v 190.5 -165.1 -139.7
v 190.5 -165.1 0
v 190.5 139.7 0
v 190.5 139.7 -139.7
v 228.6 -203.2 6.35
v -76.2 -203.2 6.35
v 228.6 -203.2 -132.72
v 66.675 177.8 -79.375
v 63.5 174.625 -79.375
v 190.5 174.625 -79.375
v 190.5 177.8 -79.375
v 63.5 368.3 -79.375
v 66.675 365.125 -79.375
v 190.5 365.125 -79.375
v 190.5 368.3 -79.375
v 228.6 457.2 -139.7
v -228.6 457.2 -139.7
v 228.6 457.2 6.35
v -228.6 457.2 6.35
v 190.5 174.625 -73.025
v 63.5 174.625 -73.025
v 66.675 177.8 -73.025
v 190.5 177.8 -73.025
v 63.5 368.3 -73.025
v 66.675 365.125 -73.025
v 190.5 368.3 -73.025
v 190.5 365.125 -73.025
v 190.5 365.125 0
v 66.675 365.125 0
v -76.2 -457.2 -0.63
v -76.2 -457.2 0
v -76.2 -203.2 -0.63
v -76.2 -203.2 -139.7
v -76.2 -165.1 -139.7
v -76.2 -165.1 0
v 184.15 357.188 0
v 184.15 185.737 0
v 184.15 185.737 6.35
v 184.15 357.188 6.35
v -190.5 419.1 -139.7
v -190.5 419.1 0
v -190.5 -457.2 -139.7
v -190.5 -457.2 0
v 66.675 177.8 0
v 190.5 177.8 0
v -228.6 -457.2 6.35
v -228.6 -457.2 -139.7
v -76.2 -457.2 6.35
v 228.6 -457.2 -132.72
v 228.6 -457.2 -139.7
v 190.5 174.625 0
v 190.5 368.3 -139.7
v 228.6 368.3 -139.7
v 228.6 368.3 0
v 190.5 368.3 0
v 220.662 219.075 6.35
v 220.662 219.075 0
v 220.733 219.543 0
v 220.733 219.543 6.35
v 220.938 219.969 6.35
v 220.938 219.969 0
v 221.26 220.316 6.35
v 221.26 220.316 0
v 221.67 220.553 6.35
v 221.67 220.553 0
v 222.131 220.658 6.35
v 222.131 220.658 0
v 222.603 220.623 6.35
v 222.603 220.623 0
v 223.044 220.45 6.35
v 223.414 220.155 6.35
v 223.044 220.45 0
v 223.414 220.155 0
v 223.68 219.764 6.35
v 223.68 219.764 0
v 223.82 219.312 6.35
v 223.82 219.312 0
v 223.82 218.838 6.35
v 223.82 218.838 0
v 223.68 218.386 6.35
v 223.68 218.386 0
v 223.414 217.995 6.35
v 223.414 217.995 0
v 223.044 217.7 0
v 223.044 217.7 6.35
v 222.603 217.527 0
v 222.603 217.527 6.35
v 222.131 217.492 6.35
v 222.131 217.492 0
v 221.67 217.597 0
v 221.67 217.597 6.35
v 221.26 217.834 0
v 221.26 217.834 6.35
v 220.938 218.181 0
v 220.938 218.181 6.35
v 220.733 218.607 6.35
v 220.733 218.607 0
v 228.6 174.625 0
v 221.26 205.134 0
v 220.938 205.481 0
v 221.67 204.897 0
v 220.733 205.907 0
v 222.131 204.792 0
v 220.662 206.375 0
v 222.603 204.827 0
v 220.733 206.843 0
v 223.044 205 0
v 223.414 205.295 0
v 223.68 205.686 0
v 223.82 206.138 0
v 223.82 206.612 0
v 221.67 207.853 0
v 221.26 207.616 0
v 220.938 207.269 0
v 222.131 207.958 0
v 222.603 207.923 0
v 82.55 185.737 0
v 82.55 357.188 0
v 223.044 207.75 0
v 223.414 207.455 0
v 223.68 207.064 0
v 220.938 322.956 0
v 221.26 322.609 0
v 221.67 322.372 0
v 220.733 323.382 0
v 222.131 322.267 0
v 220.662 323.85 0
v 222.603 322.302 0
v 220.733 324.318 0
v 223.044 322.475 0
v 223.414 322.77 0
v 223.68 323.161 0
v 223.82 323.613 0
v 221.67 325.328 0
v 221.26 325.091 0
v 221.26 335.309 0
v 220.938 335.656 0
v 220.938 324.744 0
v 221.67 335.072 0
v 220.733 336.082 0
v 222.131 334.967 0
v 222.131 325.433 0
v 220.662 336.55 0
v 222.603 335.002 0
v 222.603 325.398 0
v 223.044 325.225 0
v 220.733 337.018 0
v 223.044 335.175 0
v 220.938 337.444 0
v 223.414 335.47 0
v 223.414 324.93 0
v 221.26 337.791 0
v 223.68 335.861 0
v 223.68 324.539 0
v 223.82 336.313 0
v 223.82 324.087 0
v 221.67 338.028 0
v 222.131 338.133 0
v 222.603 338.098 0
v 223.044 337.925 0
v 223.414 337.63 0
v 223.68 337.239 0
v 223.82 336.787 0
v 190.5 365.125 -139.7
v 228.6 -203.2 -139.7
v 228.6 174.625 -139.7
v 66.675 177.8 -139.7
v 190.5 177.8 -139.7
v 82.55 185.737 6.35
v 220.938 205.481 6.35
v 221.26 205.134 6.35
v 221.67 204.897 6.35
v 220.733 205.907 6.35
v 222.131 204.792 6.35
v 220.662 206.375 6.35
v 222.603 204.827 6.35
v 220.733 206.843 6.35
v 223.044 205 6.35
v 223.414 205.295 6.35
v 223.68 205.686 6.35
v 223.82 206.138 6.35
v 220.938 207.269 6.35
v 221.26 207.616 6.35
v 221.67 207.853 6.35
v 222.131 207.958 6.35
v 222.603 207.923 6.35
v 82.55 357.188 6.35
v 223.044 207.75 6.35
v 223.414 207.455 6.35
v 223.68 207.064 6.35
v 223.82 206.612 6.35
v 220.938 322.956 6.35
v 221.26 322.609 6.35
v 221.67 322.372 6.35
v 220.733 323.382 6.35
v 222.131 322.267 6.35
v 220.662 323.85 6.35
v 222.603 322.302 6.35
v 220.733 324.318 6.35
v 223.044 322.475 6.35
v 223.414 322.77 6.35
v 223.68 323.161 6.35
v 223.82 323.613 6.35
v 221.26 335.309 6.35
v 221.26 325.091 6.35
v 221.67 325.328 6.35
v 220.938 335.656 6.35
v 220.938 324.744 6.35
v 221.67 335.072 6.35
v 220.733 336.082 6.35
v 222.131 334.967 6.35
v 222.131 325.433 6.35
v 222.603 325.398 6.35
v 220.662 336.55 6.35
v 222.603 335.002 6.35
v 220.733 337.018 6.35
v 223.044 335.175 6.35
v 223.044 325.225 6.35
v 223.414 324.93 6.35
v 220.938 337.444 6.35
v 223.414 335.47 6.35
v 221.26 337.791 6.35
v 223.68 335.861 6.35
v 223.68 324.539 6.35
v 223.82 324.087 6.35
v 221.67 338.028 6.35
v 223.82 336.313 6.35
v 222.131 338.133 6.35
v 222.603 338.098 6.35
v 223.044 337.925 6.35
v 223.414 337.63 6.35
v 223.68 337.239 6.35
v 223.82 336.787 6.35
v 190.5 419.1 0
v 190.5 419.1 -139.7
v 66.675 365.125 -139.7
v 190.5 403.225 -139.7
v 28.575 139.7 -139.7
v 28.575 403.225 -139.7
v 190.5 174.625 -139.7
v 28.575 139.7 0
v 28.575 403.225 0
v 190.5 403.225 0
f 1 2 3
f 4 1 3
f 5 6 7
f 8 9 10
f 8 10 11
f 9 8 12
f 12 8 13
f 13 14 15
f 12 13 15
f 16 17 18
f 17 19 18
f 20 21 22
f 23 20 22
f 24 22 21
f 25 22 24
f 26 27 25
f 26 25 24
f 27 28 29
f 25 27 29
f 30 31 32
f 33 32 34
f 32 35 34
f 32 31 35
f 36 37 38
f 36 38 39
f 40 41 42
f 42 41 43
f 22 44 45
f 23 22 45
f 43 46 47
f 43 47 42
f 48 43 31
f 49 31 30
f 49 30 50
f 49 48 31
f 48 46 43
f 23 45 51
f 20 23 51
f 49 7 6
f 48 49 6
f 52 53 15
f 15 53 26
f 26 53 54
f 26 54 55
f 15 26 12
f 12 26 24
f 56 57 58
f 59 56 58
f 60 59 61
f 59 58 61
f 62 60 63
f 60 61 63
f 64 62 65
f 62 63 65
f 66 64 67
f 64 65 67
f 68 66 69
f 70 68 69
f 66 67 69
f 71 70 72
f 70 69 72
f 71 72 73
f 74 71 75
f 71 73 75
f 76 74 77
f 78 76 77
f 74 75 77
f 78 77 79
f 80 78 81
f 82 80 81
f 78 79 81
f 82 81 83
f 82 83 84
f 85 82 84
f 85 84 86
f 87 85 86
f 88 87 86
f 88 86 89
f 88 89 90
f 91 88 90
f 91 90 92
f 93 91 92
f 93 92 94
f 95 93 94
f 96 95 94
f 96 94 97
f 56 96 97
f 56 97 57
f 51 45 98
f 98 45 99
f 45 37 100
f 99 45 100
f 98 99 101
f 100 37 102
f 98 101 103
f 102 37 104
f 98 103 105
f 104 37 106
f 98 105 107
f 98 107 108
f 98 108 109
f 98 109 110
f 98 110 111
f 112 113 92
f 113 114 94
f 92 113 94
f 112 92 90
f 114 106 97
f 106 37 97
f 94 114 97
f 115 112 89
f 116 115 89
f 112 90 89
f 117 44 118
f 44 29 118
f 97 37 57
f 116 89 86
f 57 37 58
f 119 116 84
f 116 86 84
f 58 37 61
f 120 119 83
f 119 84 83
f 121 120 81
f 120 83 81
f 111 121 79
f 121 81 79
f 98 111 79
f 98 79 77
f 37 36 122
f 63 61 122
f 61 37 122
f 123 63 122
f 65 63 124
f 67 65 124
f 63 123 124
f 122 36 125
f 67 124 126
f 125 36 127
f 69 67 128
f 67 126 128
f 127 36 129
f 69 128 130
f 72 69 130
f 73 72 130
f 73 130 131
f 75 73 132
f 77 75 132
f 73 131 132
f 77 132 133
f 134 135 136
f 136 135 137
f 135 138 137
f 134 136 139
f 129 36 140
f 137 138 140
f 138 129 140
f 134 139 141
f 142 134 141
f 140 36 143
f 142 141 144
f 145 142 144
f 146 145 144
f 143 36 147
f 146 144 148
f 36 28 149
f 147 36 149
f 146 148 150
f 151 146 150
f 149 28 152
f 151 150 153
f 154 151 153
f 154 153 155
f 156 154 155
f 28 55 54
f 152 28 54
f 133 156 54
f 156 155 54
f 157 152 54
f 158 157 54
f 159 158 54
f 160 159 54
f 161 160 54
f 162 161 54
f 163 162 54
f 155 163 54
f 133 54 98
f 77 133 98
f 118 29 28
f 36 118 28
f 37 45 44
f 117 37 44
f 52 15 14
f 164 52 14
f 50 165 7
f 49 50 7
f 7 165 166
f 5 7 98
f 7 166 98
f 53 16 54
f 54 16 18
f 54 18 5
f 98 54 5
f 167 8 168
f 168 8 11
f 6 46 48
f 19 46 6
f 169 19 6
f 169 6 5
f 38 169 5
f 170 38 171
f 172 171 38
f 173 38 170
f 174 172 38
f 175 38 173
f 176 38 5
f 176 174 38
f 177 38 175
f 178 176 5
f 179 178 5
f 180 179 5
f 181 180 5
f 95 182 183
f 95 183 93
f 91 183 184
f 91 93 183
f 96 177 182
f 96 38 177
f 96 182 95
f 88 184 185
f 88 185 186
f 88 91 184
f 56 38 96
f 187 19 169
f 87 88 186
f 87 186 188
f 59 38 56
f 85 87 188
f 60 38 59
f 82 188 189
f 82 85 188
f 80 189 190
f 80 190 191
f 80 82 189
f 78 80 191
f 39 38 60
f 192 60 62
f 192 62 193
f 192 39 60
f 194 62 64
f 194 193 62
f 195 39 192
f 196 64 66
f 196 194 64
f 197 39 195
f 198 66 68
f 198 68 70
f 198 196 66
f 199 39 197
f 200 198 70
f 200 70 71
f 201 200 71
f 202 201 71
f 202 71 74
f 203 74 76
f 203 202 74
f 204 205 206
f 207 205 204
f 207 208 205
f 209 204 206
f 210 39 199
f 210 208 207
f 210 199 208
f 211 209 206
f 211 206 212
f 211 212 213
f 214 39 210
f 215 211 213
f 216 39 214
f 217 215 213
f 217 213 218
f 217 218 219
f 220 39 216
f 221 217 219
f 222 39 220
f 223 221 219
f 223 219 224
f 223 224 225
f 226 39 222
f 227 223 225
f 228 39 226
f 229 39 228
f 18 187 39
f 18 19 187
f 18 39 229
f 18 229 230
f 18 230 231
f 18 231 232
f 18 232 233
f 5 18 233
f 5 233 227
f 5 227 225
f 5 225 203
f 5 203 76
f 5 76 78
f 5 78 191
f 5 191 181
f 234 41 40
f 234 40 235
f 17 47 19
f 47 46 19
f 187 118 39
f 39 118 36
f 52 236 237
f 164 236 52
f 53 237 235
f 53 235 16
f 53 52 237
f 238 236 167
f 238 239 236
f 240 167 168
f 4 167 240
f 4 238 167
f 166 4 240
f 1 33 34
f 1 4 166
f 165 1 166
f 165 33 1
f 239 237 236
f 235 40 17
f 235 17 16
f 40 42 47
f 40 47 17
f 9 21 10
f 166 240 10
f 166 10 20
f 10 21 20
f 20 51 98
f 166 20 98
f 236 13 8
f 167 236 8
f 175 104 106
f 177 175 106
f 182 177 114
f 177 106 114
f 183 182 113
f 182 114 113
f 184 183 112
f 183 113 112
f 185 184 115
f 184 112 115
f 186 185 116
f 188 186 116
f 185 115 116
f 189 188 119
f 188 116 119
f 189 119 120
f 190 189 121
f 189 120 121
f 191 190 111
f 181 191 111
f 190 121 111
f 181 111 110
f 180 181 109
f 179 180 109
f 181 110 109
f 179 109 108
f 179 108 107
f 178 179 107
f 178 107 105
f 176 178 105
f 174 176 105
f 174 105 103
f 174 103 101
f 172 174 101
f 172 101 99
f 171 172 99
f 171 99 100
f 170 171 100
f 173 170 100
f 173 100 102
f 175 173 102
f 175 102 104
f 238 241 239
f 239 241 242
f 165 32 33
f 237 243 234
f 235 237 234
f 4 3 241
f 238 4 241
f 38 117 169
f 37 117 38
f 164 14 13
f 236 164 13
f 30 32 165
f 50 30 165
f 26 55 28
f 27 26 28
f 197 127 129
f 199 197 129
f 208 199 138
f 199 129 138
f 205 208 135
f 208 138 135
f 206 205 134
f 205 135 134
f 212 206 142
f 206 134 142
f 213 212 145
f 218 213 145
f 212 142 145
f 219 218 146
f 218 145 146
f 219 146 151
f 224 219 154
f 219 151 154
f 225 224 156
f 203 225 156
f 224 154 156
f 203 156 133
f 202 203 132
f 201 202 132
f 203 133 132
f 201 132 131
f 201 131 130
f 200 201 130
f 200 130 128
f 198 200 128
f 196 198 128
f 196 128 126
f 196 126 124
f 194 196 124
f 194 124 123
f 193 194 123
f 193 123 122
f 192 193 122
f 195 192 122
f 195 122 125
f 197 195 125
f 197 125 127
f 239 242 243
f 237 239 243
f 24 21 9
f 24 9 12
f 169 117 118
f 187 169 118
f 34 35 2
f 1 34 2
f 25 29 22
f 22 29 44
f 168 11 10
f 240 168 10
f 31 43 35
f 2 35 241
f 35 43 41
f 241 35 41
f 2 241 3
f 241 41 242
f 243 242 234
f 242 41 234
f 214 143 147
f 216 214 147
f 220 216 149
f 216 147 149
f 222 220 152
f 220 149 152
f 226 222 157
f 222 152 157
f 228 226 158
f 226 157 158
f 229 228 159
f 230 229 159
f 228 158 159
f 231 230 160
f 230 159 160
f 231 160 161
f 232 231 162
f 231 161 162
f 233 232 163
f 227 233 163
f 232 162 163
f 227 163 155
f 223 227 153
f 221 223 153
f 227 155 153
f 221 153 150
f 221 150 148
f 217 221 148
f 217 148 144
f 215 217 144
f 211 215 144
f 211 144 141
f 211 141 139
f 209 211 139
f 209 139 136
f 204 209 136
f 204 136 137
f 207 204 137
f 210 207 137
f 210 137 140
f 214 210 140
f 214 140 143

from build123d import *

# Parameters (mm, degrees)
F0_W     = 457.2
F0_H     = 914.4
F0_W_2   = 101.6
F0_H_2   = 171.45
F1_DEPTH = 6.35
F2_W     = 381
F2_H     = 38.1
F2_W_2   = 266.7
F2_W_3   = 38.1
F2_H_2   = 187.325
F3_DEPTH = 139.7
F4_W     = 193.675
F4_H     = 6.35
F5_DEPTH = 165.1
F6_W     = 304.8
F6_H     = 254
F7_DEPTH = 12.7
F9_DEPTH = 254
F11_D    = 3.175


with BuildPart() as f1:
    # F0 (on Top) → F1 (new body)
    with BuildSketch(Plane.XY):
        Rectangle(F0_W, F0_H)
        with Locations((133.35, 271.4625)):
            Rectangle(F0_W_2, F0_H_2, mode=Mode.SUBTRACT)
    extrude(amount=F1_DEPTH)

    # F2 (on face) → F3 (join)
    with BuildSketch(Plane(origin=(0, 0, 0), x_dir=(1, 0, 0), z_dir=(0, 0, -1))):
        Polygon((-190.5, 457.2), (-228.6, 457.2), (-228.6, -457.2), (-190.5, -457.2), (-190.5, -419.1), align=None)
        with Locations((0, -438.15)):
            Rectangle(F2_W, F2_H)
        Polygon((190.5, -403.225), (190.5, -419.1), (190.5, -457.2), (228.6, -457.2), (228.6, -368.3), (190.5, -368.3), align=None)
        Polygon((228.6, -174.625), (228.6, 203.2), (190.5, 203.2), (190.5, 165.1), (190.5, -139.7), (190.5, -174.625), align=None)
        with Locations((57.15, 184.15)):
            Rectangle(F2_W_2, F2_H)
        Polygon((28.575, -403.225), (190.5, -403.225), (190.5, -368.3), (190.5, -365.125), (66.675, -365.125), (28.575, -365.125), align=None)
        with Locations((47.625, -271.4625)):
            Rectangle(F2_W_3, F2_H_2)
        Polygon((190.5, -177.8), (190.5, -174.625), (190.5, -139.7), (28.575, -139.7), (28.575, -177.8), (66.675, -177.8), align=None)
    extrude(amount=F3_DEPTH)

    # F4 (on face) → F5 (cut)
    with BuildSketch(Plane.YZ.offset(228.6)):
        with Locations((271.4625, -76.2)):
            Rectangle(F4_W, F4_H)
    extrude(amount=-F5_DEPTH, mode=Mode.SUBTRACT)

    # F6 (on face) → F7 (cut)
    with BuildSketch(Plane.XY.offset(6.35)):
        with Locations((76.2, -330.2)):
            Rectangle(F6_W, F6_H)
    extrude(amount=-F7_DEPTH, mode=Mode.SUBTRACT)

    # F8 (on face) → F9 (join)
    with BuildSketch(Plane.XZ.offset(203.2)):
        Polygon((228.6, -132.720256), (-76.2, 6.35), (-76.2, 0), (-76.2, -0.629744), (228.6, -139.7), align=None)
    extrude(amount=F9_DEPTH)

    # F11 (through all)
    with Locations(Plane.XY.offset(6.35)):
        with Locations((222.25, 336.55), (222.25, 323.85), (222.25, 219.075), (222.25, 206.375)):
            Hole(F11_D / 2)


solid = f1.part
